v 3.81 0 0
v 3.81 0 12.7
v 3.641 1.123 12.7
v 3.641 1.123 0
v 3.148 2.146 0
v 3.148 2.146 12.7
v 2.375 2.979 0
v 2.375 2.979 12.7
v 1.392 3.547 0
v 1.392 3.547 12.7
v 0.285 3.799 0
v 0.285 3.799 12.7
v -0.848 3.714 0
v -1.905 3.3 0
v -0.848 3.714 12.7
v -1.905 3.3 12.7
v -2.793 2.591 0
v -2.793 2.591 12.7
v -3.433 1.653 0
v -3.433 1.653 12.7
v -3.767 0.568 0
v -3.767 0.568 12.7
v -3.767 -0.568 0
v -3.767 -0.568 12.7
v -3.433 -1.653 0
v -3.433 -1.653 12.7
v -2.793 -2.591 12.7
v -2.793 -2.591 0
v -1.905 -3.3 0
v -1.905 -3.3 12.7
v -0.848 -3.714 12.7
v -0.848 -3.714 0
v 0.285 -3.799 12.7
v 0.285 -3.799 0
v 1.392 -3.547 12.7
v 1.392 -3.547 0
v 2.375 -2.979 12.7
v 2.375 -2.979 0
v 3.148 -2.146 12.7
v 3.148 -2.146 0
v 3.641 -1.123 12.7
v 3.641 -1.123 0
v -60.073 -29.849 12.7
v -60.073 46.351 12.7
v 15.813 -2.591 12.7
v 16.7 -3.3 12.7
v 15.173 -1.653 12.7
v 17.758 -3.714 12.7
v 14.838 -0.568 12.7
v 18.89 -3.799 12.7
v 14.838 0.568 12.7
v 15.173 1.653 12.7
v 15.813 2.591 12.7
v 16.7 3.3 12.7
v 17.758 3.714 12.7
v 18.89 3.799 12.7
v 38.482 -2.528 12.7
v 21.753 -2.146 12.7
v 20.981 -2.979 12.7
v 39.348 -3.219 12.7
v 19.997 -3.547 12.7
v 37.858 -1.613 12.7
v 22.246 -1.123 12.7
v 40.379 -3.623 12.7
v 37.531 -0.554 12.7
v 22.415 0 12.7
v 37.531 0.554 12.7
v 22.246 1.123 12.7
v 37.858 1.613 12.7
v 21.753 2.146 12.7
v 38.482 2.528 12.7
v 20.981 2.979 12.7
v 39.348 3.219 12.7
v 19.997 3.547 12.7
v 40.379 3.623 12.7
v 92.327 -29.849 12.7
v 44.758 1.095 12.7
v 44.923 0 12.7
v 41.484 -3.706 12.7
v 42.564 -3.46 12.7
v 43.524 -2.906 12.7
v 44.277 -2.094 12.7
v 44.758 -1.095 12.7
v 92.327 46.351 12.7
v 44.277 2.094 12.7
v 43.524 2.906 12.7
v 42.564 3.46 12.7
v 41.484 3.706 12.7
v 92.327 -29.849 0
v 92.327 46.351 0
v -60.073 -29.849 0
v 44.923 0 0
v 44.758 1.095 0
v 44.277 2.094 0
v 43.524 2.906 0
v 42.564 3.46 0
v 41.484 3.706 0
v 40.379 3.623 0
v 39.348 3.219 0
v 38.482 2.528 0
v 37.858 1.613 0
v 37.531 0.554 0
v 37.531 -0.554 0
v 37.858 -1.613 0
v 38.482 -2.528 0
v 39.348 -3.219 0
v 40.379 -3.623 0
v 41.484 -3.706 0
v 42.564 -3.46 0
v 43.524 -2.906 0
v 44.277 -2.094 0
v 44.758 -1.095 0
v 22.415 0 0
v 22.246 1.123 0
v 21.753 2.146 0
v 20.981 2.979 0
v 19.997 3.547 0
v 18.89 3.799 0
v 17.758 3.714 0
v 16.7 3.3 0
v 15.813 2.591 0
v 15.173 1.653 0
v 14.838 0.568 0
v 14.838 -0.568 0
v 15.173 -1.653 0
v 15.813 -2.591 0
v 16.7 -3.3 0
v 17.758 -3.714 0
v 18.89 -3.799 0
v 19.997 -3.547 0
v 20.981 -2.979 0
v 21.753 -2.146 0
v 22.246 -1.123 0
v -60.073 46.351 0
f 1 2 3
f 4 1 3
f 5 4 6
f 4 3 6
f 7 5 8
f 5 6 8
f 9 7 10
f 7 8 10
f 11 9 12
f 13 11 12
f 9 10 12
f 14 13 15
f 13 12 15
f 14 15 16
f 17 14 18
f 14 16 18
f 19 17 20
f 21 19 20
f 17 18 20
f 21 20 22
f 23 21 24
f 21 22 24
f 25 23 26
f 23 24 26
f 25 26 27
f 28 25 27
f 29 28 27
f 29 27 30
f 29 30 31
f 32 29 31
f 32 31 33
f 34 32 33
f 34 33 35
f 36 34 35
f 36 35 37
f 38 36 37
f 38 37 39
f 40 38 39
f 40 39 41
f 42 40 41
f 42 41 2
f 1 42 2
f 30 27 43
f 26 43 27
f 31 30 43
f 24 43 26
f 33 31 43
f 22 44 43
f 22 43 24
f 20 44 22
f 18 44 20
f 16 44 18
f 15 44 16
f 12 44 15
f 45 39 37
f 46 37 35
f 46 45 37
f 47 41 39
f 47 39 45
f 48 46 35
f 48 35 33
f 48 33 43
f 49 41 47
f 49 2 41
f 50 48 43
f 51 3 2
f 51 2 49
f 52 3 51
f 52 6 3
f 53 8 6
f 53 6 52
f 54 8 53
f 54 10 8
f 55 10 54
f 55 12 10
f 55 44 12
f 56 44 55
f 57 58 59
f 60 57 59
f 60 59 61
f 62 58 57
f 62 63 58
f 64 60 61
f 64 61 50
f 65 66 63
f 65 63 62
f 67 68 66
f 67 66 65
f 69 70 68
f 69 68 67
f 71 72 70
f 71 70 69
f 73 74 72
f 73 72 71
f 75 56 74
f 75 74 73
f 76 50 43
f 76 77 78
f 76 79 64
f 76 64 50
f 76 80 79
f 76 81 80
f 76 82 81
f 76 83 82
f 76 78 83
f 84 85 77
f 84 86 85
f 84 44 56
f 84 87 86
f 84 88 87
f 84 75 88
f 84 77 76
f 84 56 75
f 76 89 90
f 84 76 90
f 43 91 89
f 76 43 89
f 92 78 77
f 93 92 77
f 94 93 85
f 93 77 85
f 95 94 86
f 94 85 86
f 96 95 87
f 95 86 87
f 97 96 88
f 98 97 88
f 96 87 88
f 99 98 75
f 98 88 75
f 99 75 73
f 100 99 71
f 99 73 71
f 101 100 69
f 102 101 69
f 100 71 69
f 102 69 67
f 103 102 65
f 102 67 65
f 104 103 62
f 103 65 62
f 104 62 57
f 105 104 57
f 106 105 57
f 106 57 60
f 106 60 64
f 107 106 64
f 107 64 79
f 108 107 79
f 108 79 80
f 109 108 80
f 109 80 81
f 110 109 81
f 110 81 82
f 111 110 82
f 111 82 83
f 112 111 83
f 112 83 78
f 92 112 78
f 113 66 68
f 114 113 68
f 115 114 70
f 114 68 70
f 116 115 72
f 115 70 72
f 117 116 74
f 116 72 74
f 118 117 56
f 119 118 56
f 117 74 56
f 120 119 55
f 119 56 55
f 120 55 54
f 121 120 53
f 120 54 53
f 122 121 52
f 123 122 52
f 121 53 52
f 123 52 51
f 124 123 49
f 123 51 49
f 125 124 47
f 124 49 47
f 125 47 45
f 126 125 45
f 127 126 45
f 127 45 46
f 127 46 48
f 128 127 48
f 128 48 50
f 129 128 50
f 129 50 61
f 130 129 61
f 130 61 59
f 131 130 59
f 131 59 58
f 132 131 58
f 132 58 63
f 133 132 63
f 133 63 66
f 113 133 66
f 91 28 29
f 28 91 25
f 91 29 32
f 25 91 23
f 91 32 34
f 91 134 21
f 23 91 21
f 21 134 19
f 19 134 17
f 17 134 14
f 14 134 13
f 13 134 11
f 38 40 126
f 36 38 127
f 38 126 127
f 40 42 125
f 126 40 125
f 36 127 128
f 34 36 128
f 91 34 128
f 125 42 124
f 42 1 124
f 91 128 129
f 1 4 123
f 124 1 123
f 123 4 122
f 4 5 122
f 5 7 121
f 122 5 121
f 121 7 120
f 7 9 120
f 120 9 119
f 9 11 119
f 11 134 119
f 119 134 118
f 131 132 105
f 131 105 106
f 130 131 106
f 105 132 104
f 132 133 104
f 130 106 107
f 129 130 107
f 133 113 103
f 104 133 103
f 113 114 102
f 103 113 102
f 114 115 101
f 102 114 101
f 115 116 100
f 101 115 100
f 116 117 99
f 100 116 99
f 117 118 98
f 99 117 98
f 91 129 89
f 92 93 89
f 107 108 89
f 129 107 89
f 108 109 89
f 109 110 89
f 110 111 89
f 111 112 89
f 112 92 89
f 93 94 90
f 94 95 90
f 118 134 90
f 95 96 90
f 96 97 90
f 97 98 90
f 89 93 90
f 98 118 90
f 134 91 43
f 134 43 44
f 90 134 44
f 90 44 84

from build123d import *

# Parameters (mm, degrees)
F0_W     = 152.4
F0_H     = 76.2
F1_DEPTH = 12.7
F2_R     = 3.81
F3_DEPTH = 25.4
F4_R     = 3.81
F4_R_2   = 3.716512
F5_DEPTH = 12.701


with BuildPart() as f1:
    # F0 (on Top) → F1 (new body)
    with BuildSketch(Plane.XY):
        with Locations((16.127278, 8.251033)):
            Rectangle(F0_W, F0_H)
    extrude(amount=F1_DEPTH)

    # F2 (on face) → F3 (cut)
    with BuildSketch(Plane.XY.offset(12.7)):
        Circle(F2_R)
    extrude(amount=-F3_DEPTH, mode=Mode.SUBTRACT)

    # F4 (on face) → F5 (cut, through all)
    with BuildSketch(Plane.XY.offset(12.7)):
        with Locations((18.605455, 0)):
            Circle(F4_R)
        with Locations((41.206335, 0)):
            Circle(F4_R_2)
    extrude(amount=-F5_DEPTH, mode=Mode.SUBTRACT)


solid = f1.part
